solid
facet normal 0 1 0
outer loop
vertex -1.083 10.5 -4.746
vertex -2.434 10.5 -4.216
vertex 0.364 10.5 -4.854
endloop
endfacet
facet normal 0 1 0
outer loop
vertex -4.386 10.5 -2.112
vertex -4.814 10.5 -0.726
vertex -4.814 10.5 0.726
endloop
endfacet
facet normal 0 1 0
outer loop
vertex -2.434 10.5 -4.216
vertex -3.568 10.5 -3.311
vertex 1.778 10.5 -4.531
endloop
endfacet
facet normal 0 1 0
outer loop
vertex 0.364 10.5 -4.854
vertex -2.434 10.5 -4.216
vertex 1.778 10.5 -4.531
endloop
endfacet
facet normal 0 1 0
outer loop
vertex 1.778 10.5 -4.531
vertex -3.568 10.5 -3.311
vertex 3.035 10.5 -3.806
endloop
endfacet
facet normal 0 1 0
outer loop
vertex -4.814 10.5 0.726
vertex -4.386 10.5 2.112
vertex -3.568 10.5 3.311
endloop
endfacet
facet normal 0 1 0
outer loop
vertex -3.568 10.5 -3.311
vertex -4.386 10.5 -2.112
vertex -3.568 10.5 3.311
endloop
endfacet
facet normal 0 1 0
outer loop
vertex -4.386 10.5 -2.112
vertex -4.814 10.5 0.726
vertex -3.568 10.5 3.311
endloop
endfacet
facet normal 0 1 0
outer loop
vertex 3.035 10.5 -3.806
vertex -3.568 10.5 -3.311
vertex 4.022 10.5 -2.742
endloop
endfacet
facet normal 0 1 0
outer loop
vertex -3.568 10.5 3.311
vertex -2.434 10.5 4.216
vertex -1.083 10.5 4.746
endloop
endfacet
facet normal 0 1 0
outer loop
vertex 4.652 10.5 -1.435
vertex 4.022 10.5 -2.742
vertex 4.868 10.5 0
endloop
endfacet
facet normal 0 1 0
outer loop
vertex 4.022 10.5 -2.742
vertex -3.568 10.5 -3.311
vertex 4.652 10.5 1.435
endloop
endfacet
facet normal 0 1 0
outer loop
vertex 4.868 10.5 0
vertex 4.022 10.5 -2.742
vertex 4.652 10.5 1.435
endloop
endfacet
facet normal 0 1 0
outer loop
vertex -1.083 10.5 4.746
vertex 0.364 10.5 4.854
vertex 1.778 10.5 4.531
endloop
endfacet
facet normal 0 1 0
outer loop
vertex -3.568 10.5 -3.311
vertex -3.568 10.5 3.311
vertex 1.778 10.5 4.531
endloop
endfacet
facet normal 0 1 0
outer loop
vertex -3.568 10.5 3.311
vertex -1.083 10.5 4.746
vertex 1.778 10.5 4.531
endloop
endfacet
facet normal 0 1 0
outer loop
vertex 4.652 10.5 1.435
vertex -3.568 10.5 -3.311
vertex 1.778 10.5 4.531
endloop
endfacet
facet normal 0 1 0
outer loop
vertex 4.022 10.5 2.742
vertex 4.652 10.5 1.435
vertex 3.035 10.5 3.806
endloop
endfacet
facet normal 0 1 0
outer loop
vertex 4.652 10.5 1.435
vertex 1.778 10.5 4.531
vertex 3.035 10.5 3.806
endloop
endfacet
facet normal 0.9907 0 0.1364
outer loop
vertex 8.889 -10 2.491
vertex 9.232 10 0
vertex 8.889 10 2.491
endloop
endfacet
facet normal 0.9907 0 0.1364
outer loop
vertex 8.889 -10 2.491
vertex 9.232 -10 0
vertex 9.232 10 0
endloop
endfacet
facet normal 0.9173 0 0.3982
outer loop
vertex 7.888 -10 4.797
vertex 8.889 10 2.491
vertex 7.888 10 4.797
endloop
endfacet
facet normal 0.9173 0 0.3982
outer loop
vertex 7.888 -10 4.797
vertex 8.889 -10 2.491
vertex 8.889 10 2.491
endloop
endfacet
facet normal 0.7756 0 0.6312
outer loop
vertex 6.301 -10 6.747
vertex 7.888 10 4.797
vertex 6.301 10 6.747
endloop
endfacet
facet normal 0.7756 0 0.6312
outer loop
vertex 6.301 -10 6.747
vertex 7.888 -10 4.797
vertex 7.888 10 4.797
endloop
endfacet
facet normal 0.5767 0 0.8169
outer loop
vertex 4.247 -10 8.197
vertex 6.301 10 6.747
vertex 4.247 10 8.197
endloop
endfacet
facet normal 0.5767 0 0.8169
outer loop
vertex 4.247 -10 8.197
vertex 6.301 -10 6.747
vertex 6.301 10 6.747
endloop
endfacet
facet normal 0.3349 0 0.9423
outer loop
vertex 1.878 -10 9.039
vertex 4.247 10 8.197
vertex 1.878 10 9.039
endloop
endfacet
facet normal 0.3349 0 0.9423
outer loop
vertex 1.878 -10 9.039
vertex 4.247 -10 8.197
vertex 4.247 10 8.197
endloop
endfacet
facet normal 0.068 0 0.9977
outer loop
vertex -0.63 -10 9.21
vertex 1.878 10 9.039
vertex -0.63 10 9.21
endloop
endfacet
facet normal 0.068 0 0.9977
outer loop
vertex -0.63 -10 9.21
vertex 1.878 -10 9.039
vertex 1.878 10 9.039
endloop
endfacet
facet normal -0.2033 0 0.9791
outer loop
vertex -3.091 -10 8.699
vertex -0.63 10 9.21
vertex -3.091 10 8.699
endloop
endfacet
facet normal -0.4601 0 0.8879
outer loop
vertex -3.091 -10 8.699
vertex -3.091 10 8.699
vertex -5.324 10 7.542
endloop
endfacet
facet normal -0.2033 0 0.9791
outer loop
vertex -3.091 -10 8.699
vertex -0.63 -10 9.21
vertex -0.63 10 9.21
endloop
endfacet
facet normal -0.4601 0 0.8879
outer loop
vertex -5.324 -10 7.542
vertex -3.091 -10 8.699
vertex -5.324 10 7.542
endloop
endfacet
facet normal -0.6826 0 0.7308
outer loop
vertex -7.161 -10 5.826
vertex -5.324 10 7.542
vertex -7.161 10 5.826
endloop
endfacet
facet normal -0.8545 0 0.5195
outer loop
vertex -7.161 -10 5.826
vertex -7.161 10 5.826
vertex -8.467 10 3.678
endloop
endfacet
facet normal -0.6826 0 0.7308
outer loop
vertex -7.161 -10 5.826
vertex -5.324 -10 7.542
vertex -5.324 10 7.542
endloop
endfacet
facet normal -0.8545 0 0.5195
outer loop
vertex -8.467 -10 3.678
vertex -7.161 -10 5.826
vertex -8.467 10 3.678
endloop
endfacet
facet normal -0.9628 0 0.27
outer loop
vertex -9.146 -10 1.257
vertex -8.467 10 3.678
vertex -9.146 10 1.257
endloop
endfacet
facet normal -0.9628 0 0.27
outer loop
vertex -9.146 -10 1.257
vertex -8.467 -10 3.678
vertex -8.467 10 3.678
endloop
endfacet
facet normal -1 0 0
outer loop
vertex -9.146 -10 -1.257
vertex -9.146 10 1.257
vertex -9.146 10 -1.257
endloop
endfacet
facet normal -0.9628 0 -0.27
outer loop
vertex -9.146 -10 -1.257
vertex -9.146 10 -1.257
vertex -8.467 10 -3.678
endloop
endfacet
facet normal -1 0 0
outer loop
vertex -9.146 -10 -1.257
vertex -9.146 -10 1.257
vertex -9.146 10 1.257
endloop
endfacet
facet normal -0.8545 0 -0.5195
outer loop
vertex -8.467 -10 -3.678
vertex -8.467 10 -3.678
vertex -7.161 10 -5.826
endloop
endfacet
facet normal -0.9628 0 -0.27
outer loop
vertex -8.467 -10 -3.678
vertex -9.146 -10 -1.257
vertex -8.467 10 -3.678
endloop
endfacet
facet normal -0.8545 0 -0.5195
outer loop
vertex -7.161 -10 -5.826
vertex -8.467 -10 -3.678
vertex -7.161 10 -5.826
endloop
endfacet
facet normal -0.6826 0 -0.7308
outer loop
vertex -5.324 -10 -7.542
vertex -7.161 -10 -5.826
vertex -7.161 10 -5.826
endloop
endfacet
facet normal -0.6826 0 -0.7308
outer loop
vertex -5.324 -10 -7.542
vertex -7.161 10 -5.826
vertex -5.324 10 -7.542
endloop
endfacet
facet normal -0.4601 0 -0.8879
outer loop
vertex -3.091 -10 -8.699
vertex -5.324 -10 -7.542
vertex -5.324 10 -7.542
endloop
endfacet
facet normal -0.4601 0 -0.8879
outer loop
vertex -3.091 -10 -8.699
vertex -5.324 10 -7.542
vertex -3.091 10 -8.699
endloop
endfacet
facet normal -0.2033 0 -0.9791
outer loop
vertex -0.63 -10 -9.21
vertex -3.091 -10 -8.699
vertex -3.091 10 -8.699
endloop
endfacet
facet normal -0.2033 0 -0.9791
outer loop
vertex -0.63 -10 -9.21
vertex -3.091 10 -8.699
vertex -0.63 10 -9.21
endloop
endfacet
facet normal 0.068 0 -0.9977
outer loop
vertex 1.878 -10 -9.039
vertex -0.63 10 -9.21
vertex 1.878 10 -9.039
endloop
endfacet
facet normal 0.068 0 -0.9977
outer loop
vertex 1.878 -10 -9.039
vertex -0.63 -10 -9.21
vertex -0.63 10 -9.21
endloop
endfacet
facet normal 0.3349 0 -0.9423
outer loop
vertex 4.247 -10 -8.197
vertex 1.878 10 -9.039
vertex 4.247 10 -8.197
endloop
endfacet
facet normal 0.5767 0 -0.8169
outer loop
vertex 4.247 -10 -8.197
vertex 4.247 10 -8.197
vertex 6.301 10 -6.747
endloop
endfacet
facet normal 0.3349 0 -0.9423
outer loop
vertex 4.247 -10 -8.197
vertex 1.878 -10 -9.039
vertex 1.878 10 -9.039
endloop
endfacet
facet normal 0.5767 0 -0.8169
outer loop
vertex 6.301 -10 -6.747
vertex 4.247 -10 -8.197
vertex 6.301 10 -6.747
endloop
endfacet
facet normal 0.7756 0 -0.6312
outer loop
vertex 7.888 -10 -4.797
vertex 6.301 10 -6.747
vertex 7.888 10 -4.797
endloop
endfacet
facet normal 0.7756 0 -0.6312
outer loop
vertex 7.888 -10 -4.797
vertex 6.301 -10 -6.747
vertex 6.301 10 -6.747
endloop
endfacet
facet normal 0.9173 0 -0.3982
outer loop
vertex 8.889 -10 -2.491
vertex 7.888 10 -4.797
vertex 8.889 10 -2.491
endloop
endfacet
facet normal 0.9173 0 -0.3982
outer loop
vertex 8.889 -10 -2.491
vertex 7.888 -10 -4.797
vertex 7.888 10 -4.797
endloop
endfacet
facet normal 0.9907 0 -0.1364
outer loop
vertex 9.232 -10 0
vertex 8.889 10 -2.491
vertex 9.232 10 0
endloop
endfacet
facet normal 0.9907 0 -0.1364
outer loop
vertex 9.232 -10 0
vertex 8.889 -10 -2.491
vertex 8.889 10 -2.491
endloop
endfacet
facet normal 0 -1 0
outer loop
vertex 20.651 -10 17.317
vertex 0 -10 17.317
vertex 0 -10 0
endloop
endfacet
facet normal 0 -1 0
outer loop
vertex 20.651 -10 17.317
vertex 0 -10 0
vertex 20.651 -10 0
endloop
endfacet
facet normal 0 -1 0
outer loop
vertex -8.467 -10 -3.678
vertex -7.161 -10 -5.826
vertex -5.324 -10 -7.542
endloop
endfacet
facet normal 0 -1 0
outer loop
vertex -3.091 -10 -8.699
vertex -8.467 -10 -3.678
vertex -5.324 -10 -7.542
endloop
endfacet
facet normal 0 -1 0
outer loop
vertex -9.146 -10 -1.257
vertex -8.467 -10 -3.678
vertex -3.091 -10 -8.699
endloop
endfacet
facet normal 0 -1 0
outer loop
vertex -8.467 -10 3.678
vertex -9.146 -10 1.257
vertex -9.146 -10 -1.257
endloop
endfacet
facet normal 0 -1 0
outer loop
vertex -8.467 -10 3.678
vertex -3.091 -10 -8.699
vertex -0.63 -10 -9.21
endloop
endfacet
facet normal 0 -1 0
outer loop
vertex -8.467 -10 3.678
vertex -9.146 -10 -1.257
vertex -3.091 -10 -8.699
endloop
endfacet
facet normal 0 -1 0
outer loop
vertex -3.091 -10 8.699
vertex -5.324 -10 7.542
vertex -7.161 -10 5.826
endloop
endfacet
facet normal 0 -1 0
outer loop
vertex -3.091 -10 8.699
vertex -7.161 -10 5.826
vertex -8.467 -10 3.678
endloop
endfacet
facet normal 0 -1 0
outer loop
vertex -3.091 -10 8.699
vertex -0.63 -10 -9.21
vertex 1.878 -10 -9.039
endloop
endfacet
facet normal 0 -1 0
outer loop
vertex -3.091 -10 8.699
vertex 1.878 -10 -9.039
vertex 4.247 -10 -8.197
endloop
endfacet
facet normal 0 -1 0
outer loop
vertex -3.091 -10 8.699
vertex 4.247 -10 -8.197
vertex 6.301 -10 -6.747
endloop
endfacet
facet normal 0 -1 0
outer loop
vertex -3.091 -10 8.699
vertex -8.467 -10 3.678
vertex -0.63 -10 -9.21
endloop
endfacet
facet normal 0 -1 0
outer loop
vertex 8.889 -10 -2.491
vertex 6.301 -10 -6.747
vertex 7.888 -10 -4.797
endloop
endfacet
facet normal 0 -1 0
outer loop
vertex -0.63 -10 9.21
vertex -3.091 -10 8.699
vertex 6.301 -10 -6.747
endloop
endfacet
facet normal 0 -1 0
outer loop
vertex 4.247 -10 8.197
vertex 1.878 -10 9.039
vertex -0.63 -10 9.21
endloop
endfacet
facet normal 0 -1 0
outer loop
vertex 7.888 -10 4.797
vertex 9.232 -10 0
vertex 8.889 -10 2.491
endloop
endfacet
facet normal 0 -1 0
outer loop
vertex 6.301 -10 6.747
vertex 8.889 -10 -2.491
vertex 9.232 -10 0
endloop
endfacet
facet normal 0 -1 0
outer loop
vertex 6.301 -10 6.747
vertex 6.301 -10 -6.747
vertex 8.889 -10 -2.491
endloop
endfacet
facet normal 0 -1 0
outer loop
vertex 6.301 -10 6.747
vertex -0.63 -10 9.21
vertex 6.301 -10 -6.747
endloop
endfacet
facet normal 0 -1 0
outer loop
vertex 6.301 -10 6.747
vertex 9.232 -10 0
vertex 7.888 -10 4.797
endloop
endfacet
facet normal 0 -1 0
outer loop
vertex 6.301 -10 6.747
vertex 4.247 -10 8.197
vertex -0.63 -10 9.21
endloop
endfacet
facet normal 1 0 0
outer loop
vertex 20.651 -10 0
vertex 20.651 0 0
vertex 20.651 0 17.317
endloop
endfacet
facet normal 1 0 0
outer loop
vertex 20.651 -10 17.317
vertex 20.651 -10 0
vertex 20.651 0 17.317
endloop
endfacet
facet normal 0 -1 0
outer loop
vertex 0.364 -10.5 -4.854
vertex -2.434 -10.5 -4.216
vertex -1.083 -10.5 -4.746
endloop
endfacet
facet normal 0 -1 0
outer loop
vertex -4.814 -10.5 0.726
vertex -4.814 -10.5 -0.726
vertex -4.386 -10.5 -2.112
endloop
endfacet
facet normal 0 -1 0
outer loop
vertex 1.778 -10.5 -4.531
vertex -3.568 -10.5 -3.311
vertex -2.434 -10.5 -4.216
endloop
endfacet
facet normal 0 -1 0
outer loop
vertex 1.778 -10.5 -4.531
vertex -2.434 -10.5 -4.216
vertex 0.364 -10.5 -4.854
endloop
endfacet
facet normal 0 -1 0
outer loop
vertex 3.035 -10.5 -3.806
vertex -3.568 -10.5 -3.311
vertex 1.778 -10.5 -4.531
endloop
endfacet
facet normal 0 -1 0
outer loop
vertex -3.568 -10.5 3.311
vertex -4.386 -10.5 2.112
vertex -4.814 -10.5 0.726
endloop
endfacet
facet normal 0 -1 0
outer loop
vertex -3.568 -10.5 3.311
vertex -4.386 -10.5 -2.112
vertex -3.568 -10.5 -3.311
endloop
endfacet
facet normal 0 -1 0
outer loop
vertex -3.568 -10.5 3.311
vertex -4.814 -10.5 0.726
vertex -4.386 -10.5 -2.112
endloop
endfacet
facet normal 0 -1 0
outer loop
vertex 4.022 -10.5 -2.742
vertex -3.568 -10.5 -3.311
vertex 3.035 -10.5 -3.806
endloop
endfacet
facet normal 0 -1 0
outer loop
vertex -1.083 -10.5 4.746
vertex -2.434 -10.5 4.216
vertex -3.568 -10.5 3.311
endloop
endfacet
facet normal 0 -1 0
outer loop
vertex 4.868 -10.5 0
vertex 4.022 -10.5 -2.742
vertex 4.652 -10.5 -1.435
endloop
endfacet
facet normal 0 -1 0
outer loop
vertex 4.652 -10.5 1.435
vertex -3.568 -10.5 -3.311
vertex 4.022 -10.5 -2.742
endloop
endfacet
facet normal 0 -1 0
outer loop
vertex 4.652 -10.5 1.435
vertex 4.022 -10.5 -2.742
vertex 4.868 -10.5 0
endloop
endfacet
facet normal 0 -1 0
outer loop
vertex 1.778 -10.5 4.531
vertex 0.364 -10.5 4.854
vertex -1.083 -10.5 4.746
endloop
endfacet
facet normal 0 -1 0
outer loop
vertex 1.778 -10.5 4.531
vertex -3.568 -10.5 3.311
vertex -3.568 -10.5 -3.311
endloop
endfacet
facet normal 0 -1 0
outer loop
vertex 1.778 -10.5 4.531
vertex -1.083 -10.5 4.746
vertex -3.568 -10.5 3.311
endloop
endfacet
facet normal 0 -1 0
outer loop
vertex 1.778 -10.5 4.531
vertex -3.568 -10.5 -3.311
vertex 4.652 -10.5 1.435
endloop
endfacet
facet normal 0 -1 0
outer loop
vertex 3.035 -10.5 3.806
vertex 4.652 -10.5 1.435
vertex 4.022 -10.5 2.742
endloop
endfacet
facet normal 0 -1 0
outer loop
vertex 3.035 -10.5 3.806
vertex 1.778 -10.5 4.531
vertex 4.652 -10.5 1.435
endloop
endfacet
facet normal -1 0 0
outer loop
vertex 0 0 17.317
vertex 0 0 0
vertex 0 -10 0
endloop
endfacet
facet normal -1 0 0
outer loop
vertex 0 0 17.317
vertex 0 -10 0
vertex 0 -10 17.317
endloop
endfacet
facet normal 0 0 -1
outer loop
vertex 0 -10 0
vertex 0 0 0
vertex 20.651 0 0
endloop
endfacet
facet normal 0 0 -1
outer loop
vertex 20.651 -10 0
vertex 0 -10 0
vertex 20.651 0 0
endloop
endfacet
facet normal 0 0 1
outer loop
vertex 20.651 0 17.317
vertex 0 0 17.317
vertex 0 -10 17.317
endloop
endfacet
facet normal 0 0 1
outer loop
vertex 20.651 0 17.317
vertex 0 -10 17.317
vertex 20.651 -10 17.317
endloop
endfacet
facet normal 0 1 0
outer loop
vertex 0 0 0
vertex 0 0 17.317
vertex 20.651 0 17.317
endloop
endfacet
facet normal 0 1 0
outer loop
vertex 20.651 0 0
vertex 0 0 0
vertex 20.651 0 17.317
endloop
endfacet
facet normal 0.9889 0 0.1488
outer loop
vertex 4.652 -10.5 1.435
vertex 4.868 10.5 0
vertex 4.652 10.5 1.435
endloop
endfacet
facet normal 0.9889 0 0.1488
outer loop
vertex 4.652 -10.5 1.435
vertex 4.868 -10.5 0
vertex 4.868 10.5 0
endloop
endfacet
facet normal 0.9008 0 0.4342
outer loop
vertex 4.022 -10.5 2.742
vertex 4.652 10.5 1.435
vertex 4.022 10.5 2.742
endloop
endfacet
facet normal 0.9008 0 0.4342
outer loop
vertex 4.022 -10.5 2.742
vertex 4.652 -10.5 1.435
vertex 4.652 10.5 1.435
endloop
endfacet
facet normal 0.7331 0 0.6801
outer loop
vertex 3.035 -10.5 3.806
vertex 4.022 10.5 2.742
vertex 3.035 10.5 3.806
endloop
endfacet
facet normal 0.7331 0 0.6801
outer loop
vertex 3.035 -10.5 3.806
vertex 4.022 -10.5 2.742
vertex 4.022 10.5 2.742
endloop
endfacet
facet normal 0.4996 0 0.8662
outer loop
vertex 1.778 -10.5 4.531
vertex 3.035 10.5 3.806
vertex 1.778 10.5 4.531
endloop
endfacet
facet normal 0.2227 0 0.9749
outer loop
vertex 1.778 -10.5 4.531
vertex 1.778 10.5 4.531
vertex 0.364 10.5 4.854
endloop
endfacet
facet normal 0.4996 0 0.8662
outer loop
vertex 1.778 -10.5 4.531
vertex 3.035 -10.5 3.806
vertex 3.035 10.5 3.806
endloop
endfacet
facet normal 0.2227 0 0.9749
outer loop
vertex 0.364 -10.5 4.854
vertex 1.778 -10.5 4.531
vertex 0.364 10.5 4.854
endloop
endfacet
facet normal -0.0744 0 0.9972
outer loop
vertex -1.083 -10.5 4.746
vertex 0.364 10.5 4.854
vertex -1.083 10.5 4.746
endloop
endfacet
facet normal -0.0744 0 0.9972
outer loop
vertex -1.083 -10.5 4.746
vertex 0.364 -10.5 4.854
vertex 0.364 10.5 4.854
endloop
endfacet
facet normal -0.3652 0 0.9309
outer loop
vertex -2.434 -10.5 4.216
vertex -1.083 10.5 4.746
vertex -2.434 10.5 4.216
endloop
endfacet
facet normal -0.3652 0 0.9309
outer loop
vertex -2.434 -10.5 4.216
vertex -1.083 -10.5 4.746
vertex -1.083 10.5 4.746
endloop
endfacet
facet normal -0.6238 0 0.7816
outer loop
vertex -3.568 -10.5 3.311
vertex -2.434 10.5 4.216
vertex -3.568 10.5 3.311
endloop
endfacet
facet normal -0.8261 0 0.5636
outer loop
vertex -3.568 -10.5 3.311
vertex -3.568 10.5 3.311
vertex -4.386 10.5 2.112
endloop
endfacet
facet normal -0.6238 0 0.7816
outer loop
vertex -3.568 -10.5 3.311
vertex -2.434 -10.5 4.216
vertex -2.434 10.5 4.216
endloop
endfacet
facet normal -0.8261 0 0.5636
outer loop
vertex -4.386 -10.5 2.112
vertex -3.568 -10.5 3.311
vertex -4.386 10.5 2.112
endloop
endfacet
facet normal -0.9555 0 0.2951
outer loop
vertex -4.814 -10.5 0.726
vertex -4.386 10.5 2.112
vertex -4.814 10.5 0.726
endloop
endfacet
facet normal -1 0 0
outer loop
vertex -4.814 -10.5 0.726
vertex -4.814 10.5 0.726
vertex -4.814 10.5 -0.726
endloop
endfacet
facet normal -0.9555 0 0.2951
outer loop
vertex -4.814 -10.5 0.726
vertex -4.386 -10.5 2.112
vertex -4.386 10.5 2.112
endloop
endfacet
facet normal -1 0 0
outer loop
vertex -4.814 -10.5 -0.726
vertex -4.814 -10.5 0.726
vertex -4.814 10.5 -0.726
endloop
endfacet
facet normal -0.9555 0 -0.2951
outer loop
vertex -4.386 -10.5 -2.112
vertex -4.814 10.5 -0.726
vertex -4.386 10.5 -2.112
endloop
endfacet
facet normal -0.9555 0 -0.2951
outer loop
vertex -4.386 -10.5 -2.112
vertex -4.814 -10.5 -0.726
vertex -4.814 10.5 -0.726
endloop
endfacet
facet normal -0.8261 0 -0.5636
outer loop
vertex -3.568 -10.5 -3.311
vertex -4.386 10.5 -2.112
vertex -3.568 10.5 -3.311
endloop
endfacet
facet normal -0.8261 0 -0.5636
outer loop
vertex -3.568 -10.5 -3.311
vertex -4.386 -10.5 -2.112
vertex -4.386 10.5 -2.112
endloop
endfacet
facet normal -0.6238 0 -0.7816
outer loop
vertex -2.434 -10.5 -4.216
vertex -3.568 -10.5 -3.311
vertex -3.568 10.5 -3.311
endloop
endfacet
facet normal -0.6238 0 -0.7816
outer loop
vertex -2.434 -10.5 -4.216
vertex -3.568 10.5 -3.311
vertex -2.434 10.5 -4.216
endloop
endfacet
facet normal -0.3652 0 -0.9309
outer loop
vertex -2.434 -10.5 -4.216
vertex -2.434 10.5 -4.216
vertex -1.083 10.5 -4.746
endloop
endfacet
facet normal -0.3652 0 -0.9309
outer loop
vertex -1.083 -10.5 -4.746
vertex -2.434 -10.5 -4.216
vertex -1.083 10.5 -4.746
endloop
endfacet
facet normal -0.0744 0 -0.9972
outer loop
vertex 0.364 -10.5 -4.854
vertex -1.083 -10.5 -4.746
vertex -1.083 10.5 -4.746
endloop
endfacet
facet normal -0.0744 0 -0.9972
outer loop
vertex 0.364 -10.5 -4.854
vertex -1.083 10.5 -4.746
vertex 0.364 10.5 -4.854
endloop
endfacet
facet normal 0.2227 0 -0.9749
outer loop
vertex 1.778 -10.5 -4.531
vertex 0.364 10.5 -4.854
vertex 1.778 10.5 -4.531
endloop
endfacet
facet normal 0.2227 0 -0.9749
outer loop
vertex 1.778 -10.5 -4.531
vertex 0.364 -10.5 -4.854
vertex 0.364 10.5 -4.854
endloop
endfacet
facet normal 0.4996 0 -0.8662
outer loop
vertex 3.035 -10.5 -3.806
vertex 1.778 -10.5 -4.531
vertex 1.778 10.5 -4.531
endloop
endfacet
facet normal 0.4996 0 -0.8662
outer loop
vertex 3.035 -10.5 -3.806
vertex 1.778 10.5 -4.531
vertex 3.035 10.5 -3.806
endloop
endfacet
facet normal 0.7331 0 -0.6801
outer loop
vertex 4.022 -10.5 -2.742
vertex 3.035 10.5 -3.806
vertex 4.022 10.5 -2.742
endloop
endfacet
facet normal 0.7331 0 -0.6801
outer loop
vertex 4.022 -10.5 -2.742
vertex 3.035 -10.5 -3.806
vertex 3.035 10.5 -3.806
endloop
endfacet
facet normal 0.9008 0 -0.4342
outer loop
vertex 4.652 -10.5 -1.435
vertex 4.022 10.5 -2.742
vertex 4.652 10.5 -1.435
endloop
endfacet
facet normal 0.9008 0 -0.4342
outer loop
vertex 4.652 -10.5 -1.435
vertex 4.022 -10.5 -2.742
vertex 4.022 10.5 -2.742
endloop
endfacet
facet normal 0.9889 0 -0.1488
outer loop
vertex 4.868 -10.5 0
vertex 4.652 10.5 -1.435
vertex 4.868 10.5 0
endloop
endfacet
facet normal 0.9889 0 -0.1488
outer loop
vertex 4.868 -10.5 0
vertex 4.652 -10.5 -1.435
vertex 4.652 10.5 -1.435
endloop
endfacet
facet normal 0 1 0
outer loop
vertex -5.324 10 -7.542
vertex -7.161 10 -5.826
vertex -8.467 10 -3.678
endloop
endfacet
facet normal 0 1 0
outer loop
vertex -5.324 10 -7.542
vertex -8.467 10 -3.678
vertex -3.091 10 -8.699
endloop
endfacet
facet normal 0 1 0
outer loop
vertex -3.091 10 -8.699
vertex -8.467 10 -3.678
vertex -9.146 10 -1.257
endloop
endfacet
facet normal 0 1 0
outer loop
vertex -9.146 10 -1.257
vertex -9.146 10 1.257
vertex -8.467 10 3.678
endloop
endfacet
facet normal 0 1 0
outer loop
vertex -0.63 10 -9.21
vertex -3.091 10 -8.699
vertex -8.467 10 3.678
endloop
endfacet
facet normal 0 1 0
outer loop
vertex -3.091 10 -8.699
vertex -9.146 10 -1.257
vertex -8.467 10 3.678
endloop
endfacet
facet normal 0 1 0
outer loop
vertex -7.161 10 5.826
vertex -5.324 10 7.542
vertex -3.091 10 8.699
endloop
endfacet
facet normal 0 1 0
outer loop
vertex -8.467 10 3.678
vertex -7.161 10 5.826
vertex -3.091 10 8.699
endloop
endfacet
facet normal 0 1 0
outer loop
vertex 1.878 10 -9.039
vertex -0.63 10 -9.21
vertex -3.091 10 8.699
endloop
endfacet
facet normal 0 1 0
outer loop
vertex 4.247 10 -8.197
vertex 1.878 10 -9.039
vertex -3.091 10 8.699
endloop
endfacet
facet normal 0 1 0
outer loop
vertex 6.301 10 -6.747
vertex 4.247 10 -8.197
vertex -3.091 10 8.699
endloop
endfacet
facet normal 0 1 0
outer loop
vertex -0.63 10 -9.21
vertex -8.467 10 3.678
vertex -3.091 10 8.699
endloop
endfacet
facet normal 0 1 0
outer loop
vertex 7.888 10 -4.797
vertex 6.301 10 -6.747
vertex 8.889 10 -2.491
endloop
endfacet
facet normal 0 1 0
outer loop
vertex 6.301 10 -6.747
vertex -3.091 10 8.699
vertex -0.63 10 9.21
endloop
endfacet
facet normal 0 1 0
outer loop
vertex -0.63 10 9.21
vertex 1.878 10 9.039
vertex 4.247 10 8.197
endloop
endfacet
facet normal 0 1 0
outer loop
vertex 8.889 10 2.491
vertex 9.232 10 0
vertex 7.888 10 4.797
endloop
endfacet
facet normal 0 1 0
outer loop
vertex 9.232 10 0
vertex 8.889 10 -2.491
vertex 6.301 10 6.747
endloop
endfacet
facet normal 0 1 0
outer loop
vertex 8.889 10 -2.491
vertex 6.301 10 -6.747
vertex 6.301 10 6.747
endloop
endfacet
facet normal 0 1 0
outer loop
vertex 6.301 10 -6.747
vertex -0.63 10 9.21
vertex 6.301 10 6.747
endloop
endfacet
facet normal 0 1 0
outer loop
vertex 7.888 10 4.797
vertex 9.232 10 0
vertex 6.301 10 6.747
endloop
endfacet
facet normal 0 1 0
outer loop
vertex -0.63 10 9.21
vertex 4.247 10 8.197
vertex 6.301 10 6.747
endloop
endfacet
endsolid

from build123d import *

# Parameters (mm, degrees)
F0_R     = 9.2316648867
F1_DEPTH = 10
F2_R     = 4.8679534535
F3_DEPTH = 10.5
F4_W     = 20.6507313997
F4_H     = 17.3169784248
F5_DEPTH = 10


with BuildPart() as f1:
    # F0 (on Front) → F1 (new body, symmetric)
    with BuildSketch(Plane.XZ):
        Circle(F0_R)
    extrude(amount=F1_DEPTH, both=True)


with BuildPart() as f3:
    # F2 (on Front) → F3 (new body, symmetric)
    with BuildSketch(Plane.XZ):
        Circle(F2_R)
    extrude(amount=F3_DEPTH, both=True)


with BuildPart() as f5:
    # F4 (on Front) → F5 (new body)
    with BuildSketch(Plane.XZ):
        with Locations((10.3253656998, 8.6584892124)):
            Rectangle(F4_W, F4_H)
    extrude(amount=F5_DEPTH)


solid = Compound([f1.part, f3.part, f5.part])
